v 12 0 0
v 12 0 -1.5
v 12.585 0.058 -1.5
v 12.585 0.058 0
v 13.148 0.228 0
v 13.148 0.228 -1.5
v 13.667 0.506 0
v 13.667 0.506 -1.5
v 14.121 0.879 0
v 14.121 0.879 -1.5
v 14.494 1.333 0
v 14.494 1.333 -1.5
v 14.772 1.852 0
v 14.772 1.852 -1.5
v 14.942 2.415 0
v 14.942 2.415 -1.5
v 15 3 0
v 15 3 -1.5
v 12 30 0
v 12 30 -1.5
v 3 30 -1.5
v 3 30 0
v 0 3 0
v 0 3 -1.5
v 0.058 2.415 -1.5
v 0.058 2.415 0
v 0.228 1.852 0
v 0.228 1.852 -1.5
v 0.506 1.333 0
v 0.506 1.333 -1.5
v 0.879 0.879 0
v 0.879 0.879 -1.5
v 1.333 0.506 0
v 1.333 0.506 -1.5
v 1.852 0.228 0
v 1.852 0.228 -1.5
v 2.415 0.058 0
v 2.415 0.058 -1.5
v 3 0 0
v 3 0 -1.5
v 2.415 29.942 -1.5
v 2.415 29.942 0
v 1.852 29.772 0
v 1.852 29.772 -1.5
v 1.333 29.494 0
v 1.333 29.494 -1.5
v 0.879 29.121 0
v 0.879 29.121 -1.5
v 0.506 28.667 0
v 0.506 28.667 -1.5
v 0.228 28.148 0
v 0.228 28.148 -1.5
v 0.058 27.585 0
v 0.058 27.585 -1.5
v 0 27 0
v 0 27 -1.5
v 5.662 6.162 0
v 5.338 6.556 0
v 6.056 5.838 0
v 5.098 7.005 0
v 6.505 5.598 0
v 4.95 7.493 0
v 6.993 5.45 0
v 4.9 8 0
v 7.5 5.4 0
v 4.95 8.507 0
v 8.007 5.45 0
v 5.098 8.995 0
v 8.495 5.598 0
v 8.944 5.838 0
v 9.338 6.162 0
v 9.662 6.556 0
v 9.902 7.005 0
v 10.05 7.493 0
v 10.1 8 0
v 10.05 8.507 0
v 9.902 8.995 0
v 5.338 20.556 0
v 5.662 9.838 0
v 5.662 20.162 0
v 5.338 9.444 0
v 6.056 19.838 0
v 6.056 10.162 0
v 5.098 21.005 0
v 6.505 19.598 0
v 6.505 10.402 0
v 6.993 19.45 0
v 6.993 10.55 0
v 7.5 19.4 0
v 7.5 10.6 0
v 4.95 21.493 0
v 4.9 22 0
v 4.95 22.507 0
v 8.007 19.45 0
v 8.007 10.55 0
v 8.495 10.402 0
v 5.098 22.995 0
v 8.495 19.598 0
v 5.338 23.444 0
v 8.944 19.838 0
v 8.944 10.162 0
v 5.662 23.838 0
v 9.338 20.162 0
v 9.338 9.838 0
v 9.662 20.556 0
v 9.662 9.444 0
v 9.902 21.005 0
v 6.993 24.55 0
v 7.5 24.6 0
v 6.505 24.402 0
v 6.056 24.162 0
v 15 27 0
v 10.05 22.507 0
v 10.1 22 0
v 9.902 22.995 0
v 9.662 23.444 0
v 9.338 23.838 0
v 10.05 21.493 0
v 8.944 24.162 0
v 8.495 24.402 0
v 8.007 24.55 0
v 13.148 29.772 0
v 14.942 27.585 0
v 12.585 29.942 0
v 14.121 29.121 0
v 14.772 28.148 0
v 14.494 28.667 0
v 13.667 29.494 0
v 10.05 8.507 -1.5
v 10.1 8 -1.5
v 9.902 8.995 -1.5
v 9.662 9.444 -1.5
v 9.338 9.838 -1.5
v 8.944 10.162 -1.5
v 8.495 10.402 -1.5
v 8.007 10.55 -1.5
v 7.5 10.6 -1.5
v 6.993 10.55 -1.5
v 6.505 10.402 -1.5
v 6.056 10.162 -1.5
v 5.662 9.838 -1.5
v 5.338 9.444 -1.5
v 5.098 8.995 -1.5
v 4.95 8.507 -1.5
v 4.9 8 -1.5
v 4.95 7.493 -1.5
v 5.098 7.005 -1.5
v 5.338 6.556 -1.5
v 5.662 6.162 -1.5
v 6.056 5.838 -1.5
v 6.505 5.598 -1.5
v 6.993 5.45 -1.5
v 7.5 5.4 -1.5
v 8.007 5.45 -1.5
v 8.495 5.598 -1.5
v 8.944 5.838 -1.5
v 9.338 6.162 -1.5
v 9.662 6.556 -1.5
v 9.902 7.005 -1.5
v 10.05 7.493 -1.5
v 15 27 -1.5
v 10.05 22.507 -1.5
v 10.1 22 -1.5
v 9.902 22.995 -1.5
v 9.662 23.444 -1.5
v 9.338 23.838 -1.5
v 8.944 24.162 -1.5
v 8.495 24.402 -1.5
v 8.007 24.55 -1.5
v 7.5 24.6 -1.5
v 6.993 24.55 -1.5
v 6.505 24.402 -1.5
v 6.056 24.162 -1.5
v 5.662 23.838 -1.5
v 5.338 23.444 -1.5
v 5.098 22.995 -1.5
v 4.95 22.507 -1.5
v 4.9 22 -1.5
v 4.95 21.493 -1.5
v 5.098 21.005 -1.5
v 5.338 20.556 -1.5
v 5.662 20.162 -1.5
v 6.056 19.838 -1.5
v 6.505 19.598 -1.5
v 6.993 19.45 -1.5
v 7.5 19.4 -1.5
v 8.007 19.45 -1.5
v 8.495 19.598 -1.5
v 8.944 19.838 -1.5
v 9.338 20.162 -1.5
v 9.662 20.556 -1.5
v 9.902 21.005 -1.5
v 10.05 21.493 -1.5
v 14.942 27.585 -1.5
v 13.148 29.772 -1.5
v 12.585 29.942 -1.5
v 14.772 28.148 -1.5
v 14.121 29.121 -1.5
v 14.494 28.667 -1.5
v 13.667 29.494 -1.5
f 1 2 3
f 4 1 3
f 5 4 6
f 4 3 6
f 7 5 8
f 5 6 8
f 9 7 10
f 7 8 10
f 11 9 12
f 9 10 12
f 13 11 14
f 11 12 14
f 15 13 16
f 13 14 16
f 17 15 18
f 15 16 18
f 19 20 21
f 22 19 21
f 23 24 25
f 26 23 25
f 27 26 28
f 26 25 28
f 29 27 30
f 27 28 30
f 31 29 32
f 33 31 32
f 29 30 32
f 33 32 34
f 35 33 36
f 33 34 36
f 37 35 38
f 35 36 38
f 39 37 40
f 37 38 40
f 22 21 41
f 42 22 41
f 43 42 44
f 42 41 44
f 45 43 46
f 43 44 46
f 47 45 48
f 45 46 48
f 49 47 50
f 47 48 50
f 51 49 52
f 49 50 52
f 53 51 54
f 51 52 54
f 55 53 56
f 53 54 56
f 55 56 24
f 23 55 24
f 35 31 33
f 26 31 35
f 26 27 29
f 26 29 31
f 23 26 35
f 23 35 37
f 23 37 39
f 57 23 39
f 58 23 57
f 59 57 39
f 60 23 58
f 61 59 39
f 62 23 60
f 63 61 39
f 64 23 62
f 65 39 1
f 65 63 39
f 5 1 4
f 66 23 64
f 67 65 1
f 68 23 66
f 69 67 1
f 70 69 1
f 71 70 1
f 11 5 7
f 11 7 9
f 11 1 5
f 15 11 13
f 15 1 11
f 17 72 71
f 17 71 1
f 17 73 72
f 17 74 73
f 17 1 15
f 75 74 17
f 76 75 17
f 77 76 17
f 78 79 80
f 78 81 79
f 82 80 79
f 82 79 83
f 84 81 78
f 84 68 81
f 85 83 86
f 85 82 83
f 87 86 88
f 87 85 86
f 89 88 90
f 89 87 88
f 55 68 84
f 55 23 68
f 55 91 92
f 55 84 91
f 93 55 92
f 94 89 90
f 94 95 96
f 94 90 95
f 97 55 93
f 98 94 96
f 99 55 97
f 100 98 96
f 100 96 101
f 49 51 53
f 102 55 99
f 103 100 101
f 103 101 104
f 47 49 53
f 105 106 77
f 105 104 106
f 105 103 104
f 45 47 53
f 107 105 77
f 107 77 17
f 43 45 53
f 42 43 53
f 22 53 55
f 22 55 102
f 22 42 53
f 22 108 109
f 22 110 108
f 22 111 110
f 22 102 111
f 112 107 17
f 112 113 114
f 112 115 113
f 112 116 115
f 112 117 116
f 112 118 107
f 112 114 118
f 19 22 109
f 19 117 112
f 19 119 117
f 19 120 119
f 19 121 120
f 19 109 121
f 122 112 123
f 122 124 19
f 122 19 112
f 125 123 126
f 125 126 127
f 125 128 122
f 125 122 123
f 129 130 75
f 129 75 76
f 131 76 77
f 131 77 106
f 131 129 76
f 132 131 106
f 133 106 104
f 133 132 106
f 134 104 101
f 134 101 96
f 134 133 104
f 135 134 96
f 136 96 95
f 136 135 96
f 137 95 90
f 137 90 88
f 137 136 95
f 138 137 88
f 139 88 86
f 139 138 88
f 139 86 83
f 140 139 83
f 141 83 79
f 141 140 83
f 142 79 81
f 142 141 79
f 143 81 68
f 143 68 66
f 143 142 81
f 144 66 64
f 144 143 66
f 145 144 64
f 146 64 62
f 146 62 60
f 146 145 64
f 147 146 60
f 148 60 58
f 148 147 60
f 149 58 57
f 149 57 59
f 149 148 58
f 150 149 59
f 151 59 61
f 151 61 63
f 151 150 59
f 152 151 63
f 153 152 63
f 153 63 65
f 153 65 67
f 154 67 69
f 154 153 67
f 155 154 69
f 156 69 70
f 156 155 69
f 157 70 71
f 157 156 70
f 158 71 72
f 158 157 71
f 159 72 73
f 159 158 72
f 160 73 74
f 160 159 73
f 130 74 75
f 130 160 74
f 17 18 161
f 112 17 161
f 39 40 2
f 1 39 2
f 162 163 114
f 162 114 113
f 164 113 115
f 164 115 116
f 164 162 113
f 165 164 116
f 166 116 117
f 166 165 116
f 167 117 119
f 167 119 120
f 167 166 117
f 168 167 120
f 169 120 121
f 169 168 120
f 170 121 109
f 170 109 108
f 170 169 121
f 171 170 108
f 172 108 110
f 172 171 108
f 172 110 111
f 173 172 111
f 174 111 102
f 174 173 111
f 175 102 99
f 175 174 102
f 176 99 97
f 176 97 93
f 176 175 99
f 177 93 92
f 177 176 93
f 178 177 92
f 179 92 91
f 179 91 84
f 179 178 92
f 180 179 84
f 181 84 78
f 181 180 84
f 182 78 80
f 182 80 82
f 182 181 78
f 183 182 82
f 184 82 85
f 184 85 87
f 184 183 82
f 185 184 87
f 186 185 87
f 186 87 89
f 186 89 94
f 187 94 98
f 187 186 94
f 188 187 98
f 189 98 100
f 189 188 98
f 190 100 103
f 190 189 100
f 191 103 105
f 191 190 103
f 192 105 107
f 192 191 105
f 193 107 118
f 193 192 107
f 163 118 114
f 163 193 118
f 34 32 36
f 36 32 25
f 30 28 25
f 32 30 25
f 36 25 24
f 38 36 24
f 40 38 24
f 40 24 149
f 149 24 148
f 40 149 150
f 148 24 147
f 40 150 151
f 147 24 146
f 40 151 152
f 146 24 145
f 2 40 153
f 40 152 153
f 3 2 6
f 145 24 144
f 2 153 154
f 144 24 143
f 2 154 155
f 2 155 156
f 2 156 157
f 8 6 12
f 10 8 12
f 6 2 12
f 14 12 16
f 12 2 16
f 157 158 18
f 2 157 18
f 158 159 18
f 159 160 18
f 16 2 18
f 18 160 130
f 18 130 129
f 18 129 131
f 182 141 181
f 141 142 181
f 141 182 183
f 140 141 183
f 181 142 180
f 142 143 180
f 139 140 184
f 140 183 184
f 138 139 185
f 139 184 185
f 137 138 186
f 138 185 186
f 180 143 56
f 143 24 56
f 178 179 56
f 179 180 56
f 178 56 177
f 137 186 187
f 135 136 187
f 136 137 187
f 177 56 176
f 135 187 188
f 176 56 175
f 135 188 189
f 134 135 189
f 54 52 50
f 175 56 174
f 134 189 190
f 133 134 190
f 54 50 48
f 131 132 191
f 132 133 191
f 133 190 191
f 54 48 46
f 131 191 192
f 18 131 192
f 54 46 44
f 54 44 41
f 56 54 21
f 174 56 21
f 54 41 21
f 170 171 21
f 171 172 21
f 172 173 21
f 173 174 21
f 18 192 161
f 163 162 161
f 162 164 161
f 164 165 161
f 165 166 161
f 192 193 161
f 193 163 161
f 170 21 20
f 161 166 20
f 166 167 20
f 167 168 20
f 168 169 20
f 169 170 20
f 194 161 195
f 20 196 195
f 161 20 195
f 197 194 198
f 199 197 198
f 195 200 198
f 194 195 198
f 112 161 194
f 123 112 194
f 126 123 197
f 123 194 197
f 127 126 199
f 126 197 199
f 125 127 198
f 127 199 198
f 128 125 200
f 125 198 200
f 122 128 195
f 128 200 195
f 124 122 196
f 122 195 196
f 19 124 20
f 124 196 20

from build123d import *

# Parameters (mm, degrees)
CONVERT_SOLID1_START     = -1.5
CONVERT_SOLID1_OUTLINE_R = 2.6
CONVERT_SOLID1_DEPTH     = 1.5


# Read off the part's stored shape, not the designer's step: Convert-Solid1
with BuildPart() as part:
    # Convert-Solid1 outline → Convert-Solid1 (new body)
    with BuildSketch(Plane.XY.offset(CONVERT_SOLID1_START)):
        with BuildLine():
            Line((15, 3), (15, 27))
            ThreePointArc((15, 27), (14.121320344, 29.121320344), (12, 30))
            Line((12, 30), (3, 30))
            ThreePointArc((3, 30), (0.878679656, 29.121320344), (0, 27))
            Line((0, 27), (0, 3))
            ThreePointArc((0, 3), (0.878679656, 0.878679656), (3, 0))
            Line((3, 0), (12, 0))
            ThreePointArc((12, 0), (14.121320344, 0.878679656), (15, 3))
        make_face()
        with Locations((7.5, 8)):
            Circle(CONVERT_SOLID1_OUTLINE_R, mode=Mode.SUBTRACT)
        with Locations((7.5, 22)):
            Circle(CONVERT_SOLID1_OUTLINE_R, mode=Mode.SUBTRACT)
    extrude(amount=CONVERT_SOLID1_DEPTH)


solid = part.part
